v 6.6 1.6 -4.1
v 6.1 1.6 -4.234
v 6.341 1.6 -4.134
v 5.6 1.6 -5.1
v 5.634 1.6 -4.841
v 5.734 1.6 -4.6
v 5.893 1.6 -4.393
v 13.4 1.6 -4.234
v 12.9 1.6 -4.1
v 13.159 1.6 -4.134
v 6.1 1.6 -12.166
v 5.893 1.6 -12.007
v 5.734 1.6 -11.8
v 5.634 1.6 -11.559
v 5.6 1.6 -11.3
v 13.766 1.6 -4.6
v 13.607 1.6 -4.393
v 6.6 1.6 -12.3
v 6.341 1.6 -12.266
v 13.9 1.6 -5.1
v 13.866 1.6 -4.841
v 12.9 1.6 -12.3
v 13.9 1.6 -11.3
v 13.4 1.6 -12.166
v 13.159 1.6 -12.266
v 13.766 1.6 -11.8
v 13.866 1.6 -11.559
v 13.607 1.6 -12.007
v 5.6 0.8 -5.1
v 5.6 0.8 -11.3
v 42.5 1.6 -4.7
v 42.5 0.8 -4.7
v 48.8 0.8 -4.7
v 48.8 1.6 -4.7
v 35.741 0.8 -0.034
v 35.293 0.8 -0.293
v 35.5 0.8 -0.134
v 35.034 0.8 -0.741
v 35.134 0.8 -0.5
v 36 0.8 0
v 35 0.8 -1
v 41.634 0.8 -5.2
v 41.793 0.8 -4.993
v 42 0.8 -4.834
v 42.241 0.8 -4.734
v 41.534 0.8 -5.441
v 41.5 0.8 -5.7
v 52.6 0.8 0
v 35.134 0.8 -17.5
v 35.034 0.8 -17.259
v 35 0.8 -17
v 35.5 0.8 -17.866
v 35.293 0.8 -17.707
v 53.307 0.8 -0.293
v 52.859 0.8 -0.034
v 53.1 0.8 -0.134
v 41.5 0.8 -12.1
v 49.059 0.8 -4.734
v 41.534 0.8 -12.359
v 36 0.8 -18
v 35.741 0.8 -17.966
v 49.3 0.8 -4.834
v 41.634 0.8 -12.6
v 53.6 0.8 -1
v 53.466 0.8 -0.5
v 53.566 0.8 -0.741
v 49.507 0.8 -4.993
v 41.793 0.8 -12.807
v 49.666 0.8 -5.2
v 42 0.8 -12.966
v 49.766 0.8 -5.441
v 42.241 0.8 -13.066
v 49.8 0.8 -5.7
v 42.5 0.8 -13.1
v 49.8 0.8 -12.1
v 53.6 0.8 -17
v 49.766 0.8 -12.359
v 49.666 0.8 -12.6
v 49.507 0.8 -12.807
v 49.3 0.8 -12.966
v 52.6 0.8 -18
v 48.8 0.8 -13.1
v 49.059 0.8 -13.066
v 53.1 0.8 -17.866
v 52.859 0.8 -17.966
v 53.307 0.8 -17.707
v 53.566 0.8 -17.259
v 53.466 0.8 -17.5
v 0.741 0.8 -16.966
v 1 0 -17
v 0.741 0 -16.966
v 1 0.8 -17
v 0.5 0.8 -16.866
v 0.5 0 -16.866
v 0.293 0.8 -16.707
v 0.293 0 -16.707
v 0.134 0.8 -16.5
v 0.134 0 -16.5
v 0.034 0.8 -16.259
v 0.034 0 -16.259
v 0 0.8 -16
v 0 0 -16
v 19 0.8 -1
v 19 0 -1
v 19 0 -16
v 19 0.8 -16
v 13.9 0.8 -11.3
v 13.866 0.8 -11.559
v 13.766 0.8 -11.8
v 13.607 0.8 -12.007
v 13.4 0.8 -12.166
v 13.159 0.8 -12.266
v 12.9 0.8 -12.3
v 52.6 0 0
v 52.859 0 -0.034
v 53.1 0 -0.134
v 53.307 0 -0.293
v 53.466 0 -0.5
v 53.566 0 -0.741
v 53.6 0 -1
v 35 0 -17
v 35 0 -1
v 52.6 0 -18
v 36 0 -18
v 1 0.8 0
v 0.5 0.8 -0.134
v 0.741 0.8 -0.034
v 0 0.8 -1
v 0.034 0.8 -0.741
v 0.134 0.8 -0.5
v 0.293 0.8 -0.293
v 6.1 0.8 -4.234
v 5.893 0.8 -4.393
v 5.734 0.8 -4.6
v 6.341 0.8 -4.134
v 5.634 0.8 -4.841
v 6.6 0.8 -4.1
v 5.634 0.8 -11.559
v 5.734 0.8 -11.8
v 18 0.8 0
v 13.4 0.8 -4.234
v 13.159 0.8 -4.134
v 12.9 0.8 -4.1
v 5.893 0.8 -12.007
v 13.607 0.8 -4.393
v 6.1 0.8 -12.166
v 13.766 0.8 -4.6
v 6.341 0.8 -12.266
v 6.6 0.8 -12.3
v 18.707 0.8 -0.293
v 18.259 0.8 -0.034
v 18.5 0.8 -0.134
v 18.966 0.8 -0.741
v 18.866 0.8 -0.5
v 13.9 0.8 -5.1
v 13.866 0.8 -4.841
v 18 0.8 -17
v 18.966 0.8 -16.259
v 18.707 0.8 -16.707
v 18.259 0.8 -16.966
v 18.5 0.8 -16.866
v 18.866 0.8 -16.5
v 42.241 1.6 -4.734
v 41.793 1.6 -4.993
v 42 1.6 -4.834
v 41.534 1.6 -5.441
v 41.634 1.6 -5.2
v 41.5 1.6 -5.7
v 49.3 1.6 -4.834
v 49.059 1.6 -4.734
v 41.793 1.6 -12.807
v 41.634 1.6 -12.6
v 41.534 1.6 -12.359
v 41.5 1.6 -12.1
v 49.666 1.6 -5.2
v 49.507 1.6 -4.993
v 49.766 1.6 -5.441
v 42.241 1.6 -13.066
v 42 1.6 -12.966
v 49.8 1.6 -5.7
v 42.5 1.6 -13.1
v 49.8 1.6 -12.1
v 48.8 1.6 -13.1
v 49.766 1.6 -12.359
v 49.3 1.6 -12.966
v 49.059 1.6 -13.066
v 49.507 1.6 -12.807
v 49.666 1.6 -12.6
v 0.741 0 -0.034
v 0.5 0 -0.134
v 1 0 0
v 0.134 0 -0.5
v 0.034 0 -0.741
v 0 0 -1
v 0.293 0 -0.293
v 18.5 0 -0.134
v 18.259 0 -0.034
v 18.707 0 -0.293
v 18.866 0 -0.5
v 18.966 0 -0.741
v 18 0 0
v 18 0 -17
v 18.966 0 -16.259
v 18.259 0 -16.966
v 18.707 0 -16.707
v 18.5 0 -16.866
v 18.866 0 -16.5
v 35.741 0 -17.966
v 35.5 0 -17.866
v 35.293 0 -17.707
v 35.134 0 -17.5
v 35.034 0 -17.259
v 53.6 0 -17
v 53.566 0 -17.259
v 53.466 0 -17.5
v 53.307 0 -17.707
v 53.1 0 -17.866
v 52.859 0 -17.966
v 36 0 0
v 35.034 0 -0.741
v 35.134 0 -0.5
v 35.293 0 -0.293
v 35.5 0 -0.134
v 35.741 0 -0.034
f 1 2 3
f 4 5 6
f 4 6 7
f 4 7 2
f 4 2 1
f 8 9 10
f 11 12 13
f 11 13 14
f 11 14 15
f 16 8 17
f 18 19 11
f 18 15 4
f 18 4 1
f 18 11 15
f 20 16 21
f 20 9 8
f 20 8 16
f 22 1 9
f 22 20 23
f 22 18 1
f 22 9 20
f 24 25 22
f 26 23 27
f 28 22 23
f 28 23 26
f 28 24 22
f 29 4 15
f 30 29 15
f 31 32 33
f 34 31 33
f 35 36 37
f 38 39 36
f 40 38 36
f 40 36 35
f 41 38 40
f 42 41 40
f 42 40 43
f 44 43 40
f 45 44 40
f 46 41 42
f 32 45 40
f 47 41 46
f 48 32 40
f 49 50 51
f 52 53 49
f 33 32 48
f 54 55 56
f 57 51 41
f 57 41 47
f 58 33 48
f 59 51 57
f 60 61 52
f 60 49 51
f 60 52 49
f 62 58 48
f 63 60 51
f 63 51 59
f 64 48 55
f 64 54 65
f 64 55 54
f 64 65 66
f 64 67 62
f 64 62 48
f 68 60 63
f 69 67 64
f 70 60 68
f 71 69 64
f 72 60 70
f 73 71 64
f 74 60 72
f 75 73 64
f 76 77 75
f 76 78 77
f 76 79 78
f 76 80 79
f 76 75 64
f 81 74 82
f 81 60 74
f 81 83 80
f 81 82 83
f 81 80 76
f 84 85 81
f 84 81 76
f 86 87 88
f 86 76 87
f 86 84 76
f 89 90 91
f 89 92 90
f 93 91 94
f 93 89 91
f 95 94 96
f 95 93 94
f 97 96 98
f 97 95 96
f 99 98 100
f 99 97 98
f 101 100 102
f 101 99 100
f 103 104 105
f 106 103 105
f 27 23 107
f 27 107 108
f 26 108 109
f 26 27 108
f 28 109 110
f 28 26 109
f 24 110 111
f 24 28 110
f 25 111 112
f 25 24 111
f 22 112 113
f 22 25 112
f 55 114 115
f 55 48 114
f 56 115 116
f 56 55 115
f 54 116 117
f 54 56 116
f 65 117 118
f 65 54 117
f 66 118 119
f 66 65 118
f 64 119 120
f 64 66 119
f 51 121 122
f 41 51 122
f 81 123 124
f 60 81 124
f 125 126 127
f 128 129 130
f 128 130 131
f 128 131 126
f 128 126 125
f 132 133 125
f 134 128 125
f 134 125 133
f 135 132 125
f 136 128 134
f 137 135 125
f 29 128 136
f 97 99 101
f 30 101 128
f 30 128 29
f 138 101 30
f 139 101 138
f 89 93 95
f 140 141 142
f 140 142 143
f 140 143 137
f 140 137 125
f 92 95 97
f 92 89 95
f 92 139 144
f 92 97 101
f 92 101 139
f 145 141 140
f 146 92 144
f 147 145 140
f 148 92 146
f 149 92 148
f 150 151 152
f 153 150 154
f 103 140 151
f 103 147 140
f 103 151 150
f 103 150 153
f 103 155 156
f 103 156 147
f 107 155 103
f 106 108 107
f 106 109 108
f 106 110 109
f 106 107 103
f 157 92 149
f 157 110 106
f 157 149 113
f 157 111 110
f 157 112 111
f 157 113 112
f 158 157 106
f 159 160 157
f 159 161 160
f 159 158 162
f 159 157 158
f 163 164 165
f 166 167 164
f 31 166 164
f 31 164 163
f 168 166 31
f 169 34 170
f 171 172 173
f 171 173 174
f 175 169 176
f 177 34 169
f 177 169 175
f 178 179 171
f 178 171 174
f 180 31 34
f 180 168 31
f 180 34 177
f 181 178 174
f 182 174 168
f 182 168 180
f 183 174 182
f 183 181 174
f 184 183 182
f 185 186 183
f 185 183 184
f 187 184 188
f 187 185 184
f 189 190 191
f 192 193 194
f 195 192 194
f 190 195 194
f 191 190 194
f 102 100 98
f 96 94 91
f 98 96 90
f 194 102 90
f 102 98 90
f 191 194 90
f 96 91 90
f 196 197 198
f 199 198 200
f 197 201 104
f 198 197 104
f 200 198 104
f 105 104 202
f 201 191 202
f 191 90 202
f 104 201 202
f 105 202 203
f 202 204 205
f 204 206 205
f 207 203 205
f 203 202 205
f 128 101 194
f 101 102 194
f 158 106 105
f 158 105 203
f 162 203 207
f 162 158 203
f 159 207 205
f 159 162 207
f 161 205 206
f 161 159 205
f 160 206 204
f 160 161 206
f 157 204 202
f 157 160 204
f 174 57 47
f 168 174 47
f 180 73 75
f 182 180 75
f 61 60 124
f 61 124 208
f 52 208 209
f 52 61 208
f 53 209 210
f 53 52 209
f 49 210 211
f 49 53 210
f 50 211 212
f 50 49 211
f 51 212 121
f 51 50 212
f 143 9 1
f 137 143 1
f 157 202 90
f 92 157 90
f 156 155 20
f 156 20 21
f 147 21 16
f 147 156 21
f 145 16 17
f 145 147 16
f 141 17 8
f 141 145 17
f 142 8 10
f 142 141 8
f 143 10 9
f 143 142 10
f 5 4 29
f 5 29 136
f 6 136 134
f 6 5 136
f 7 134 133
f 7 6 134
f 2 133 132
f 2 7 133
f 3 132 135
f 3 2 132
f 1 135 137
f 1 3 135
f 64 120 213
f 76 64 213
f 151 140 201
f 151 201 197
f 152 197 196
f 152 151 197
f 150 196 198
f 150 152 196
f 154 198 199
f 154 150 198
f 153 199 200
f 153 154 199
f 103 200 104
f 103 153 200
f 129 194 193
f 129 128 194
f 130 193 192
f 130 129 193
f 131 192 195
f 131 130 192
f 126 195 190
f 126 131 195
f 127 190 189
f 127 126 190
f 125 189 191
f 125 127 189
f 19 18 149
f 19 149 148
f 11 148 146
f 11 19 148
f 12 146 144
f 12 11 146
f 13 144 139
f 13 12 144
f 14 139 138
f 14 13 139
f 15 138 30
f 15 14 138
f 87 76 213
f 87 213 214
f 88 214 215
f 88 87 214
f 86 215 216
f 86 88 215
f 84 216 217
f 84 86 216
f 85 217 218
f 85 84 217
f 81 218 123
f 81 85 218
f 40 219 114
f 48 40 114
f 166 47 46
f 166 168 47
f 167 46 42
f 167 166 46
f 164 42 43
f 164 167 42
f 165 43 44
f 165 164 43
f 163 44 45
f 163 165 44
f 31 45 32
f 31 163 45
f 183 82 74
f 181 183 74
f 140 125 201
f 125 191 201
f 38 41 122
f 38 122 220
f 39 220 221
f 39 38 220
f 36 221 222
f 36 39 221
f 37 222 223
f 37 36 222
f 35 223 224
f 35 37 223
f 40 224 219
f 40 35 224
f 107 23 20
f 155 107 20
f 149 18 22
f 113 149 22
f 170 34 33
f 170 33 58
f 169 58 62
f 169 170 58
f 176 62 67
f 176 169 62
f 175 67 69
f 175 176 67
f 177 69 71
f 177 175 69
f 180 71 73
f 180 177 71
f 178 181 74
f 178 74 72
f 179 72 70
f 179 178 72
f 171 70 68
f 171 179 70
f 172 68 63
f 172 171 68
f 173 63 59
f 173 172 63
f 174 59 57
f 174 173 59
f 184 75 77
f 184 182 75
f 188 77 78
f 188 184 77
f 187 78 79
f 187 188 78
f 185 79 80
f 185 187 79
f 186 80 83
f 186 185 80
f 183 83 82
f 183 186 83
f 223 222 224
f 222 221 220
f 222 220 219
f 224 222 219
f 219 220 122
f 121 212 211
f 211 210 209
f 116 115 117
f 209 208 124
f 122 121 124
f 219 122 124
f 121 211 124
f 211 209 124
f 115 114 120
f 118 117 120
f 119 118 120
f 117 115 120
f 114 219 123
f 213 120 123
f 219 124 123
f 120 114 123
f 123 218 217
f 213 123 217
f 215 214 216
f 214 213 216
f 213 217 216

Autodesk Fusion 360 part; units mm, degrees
sketch "Sketch1" plane through (0, 0, 0) normal (0, 1, 0) x (1, 0, 0)
  line L0 (0, 0) -> (19, 0)
  line L1 (19, 0) -> (19, 17)
  line L2 (19, 17) -> (0, 17)
  line L3 (0, 17) -> (0, 0)
  line L4 (9.5, 0) -> (9.5, 12.3)
  line L5 (0, 8.5) -> (13.9, 8.5)
  line L6 (13.9, 12.3) -> (5.6, 12.3)
  line L7 (5.6, 12.3) -> (5.6, 4.1)
  line L8 (5.6, 4.1) -> (13.9, 4.1)
  line L9 (13.9, 4.1) -> (13.9, 12.3)
  dimension "d1" = 19
  dimension "d2" = 17
  dimension "d3" = 12.3
  dimension "d4" = 13.9
  dimension "d5" = 8.3
  dimension "d6" = 8.2
extrude "Extrude1" add sketch "Sketch1" along normal blind 1 makes body 1
extrude "Extrude2" add sketch "Sketch1" along normal blind 1.6 contours L4 L5 L7 L8 | L4 L5 L8 L9 | L4 L5 L6 L7 | L4 L5 L6 L9 bodies 1
extrude "Extrude3" cut 1 faces at (1.8667, 1, -9.7667) along direction (0, -1, 0) blind 0.2 on bodies 1 bodies 1
fillet "Fillet1" radius 1 4 edges at (5.6, 1.2, -4.1) (13.9, 1.2, -4.1) (13.9, 1.2, -12.3) (5.6, 1.2, -12.3) on bodies 1
fillet "Fillet2" radius 1 4 edges at (19, 0.4, -17) (0, 0.4, -17) (0, 0.4, 0) (19, 0.4, 0) on bodies 1
sketch "Sketch2" plane through (0, 0, 0) normal (0, 1, 0) x (1, 0, 0)
  line L0 (35, 0) -> (53.6, 0)
  line L1 (53.6, 0) -> (53.6, 18)
  line L2 (53.6, 18) -> (35, 18)
  line L3 (35, 18) -> (35, 0)
  line L4 (53.6, 9) -> (49.8, 9)
  line L5 (44.3, 18) -> (44.3, 13.1)
  line L6 (49.8, 13.1) -> (41.5, 13.1)
  line L7 (41.5, 13.1) -> (41.5, 4.7)
  line L8 (41.5, 4.7) -> (49.8, 4.7)
  line L9 (49.8, 4.7) -> (49.8, 13.1)
  dimension "d17" = 18.6
  dimension "d18" = 18
  dimension "d19" = 3.8
  dimension "d20" = 4.9
  dimension "d21" = 8.3
  dimension "d22" = 8.4
extrude "Extrude4" add sketch "Sketch2" along normal blind 0.8 separate body makes body 2
extrude "Extrude5" add sketch "Sketch2" along normal blind 1.6 contours L6 L7 L8 L9 bodies 2
fillet "Fillet3" radius 1 8 edges at (41.5, 1.2, -4.7) (35, 0.4, 0) (35, 0.4, -18) (49.8, 1.2, -13.1) (41.5, 1.2, -13.1) (53.6, 0.4, -18) (49.8, 1.2, -4.7) (53.6, 0.4, 0) on bodies 2
equation "d3 = 25.6 mm - 13.3 mm"
equation "d4 = 63.1 mm - 49.2 mm"
